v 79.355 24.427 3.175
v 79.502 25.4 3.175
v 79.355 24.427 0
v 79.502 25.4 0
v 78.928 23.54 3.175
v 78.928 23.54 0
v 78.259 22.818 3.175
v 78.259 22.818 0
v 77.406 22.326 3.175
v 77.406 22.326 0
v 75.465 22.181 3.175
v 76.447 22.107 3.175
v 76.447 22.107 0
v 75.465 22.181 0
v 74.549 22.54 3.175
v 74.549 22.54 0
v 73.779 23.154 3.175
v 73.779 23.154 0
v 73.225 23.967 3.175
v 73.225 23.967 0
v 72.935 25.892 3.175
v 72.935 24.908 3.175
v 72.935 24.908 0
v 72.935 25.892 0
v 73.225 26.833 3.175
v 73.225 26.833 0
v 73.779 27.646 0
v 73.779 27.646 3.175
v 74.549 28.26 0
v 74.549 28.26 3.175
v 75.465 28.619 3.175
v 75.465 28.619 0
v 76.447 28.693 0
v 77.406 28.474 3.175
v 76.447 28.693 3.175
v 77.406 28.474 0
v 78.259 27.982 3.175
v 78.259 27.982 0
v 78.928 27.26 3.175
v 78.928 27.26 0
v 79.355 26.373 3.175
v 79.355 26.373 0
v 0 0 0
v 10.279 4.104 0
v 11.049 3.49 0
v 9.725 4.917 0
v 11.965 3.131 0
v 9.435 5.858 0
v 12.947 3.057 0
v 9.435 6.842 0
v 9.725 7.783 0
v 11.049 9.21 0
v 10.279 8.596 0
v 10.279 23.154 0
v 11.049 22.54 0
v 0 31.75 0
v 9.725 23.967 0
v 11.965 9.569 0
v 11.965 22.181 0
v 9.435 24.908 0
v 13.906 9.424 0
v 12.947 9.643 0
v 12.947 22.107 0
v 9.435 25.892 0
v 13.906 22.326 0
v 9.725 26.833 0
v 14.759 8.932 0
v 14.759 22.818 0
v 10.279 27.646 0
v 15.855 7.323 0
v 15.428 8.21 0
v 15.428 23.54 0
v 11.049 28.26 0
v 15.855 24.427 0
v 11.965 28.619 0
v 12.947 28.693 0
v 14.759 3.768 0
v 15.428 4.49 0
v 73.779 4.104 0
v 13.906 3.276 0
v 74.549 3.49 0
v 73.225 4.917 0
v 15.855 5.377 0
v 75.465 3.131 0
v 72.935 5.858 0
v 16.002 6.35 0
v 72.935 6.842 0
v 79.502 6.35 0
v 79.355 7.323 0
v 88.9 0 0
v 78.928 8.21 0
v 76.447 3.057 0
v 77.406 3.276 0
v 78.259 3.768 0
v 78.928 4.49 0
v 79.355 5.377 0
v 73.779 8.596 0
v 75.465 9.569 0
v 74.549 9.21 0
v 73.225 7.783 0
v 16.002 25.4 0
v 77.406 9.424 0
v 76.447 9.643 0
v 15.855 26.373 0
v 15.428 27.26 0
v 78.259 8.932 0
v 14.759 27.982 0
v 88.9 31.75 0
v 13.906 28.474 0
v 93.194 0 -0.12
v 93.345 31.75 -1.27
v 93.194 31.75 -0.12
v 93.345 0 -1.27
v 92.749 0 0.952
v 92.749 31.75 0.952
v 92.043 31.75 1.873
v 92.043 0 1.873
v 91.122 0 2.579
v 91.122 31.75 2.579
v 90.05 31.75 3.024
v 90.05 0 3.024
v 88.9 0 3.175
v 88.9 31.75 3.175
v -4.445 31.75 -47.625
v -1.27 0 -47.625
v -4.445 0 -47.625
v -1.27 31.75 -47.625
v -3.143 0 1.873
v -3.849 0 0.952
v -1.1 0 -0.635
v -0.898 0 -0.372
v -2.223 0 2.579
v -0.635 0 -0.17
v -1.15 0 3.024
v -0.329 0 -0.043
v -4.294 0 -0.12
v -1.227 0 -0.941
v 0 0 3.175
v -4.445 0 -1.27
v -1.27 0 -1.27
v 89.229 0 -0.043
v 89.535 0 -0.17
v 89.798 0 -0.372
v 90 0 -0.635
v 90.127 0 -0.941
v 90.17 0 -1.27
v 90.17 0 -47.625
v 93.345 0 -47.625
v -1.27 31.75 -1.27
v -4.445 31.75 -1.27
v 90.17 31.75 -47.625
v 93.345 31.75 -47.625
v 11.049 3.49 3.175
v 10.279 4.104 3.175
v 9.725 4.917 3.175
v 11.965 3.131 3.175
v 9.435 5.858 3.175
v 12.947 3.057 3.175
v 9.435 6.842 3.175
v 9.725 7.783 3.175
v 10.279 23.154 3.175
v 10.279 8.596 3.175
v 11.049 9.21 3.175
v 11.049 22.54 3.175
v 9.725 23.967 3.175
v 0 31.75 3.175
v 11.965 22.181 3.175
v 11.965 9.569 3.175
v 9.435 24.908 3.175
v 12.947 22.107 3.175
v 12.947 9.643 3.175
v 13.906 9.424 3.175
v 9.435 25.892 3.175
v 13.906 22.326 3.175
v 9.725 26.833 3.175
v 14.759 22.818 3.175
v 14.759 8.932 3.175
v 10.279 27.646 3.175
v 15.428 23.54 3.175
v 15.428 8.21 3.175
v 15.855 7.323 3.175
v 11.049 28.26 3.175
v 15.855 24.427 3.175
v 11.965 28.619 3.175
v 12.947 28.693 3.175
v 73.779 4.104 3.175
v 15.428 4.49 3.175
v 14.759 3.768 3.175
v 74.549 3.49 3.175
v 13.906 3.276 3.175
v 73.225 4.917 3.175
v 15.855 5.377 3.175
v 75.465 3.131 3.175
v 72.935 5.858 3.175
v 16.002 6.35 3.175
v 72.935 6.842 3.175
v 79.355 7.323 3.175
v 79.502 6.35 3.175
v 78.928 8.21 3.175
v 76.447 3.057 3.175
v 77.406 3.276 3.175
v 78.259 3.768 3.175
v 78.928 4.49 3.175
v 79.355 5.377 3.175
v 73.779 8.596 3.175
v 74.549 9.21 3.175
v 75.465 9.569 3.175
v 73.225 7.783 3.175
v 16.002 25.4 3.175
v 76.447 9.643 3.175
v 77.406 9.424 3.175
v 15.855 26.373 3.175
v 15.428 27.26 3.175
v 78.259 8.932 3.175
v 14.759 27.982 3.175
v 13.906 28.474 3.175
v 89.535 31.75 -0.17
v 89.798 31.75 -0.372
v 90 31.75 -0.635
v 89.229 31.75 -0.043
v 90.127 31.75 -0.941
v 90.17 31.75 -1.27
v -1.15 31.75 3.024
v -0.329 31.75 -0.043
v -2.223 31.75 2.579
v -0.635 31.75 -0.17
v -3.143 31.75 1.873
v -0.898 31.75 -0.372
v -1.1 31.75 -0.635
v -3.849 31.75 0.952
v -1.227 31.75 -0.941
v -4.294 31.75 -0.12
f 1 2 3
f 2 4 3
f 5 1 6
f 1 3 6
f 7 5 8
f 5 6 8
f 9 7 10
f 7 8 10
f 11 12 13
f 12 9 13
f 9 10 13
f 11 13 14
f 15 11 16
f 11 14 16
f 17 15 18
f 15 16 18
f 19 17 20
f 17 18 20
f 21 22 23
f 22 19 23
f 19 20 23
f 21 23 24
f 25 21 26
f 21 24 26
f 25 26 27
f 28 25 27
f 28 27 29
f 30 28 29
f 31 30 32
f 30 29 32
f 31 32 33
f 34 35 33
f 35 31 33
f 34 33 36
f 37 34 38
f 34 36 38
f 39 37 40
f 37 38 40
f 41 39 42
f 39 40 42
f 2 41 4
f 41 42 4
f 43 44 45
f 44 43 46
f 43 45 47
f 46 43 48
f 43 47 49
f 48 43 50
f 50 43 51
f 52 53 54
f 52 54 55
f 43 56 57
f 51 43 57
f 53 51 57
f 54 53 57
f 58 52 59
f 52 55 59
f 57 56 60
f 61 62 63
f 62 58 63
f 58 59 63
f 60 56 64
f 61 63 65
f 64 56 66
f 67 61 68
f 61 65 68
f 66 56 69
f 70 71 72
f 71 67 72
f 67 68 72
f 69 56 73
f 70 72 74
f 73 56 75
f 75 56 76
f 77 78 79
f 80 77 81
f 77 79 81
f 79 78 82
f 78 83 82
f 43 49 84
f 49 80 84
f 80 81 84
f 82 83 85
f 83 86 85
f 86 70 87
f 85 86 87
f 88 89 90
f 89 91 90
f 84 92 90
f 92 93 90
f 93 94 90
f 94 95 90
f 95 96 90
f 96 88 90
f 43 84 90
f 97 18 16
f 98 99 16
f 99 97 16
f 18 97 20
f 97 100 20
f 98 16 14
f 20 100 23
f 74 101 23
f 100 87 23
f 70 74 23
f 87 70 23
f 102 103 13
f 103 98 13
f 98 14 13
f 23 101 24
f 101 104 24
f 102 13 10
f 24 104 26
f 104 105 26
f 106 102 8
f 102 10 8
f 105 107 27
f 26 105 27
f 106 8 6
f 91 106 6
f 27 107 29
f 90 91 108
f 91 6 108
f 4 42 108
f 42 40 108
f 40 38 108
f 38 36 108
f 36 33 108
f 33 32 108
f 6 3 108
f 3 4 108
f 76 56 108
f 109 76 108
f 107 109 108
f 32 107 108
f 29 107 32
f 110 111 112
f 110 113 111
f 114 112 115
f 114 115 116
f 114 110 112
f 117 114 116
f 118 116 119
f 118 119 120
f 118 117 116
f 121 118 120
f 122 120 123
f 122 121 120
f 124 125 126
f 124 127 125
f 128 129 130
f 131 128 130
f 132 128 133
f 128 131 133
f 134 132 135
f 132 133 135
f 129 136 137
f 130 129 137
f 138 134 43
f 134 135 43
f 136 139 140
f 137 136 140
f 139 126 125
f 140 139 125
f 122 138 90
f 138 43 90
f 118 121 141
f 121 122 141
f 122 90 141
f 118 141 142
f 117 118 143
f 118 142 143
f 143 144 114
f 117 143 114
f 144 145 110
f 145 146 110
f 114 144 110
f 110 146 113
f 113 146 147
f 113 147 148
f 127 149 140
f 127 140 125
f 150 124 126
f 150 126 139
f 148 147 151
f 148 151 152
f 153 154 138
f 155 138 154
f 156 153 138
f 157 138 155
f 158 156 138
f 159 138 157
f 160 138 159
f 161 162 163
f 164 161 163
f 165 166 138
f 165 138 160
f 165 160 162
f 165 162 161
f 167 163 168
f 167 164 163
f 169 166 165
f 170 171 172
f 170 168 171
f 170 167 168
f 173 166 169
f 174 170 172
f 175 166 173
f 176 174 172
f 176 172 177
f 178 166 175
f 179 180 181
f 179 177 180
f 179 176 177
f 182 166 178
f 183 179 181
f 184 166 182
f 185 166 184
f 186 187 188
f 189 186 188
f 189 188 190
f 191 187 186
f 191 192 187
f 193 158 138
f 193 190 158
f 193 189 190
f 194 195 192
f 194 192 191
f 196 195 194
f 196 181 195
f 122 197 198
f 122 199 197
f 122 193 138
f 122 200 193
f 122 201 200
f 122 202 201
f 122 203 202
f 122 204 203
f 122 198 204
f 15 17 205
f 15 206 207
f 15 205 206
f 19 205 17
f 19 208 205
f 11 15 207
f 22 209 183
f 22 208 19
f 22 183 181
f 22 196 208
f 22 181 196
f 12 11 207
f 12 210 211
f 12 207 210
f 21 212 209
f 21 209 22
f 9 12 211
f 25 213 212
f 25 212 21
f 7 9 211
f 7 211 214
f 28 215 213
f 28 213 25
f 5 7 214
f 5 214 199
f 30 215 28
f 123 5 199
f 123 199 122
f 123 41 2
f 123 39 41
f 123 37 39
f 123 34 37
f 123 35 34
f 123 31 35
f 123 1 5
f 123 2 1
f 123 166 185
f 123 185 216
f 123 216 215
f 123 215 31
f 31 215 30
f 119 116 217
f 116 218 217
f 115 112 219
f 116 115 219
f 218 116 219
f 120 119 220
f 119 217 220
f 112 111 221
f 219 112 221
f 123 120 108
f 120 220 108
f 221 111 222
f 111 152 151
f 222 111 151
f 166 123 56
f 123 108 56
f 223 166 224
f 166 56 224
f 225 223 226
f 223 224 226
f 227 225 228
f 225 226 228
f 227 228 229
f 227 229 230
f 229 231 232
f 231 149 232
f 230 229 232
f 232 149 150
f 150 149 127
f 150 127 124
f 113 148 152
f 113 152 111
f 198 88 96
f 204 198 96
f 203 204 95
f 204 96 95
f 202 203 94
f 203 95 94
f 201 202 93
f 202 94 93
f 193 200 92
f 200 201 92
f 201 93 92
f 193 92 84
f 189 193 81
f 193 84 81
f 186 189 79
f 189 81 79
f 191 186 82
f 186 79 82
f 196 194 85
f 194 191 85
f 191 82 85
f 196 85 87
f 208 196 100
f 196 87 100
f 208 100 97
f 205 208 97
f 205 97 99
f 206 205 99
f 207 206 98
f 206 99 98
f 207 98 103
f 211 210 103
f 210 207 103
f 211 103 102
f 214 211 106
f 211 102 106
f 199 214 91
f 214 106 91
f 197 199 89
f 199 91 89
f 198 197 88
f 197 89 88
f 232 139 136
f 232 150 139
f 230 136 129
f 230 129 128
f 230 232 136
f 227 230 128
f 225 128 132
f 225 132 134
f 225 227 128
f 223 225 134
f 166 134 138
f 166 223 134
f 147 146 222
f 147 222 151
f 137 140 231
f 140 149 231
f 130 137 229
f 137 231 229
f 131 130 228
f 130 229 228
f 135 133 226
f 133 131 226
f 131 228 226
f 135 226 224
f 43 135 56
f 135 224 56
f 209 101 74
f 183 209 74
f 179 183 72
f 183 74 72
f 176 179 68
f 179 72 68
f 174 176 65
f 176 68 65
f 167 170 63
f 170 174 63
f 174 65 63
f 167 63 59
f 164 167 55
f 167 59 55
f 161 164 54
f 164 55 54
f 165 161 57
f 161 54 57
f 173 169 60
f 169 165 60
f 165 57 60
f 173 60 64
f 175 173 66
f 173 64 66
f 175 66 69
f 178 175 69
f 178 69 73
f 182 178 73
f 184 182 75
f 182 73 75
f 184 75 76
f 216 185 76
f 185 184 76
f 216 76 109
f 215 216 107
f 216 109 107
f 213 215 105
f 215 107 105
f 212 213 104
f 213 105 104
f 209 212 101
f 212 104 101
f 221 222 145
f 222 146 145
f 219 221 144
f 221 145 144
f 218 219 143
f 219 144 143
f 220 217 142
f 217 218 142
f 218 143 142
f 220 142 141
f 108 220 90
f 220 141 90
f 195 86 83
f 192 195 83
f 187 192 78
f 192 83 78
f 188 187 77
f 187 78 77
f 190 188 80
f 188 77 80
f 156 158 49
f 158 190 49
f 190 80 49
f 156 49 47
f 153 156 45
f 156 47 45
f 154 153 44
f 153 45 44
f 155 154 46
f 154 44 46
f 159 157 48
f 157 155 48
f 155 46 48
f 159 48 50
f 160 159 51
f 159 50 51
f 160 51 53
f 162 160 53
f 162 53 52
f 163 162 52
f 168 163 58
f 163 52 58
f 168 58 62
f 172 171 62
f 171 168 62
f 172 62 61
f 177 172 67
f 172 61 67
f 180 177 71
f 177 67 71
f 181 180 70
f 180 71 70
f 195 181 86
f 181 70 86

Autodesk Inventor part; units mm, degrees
ref_plane "YZ Plane" through (0, 0, 0) normal (1, 0, 0) x (0, 1, 0)
ref_plane "XZ Plane" through (0, 0, 0) normal (0, 1, 0) x (-1, 0, 0)
ref_plane "XY Plane" through (0, 0, 0) normal (0, 0, 1) x (1, 0, 0)
sketch "Sketch1" plane through (0, 0, 0) normal (0, 0, 1) x (1, 0, 0)
  line L0 (0, 0) -> (88.9, 0)
  line L1 (88.9, 0) -> (88.9, 31.75)
  line L2 (88.9, 31.75) -> (0, 31.75)
  line L3 (0, 31.75) -> (0, 0)
  circle A0 centre (12.7, 25.4) radius 3.302
  circle A1 centre (76.2, 25.4) radius 3.302
  circle A2 centre (12.7, 6.35) radius 3.302
  circle A3 centre (76.2, 6.35) radius 3.302
  line L4 (12.7, 25.4) -> (76.2, 25.4) construction
  line L5 (44.45, 31.75) -> (44.45, 0) construction
  point P0 (44.45, 25.4)
  dimension "d0" = 88.9
  dimension "d2" = 31.75
  dimension "d5" = 63.5
  dimension "d8" = 19.05
  dimension "d11" = 6.35
  dimension "d12" = 6.604
extrude "Plate1" add sketch "Sketch1" along normal blind 3.175
sketch "Sketch2" plane through (90.17, 0, -1.27) normal (1, 0, 0) x (0, 1, 0)
  line L0 (31.75, 0) -> (0, 0)
  line L1 (0, 0) -> (0, -46.355)
  line L2 (0, -46.355) -> (31.75, -46.355)
  line L3 (31.75, -46.355) -> (31.75, 0)
edge flange "Flange1" height 50.8 angle 90 thickness 3.175 bend radius 1.27 thickness toward (1, 0, 0) relief straight relief width 3.175 relief depth 1.5875 corner gap 3.175 corner form 0 edges at (88.9, 15.875, 0) (0, 15.875, 0) wall of the first edge with corners at (90.17, 31.75, -1.27) (90.17, 0, -1.27) (90.17, 0, -47.625) (90.17, 31.75, -47.625)
bend "Bend1"
corner "Corner1"
equation "\"d16\" = BendReliefWidth"
equation "\"d17\" = BendReliefDepth"
equation "\"d18\" = MinimumRemnant"
equation "\"d19\" = BendRadius"
equation "\"d23\" = CornerReliefSize"
equation "\"d24\" = GapSize"
equation "\"d25\" = JacobiRadiusSize"
equation "\"BendRadius\" = Thickness"
equation "\"BendReliefWidth\" = Thickness"
equation "\"BendReliefDepth\" = 0.5 * Thickness"
equation "\"CornerReliefSize\" = 4 * Thickness"
equation "\"MinimumRemnant\" = 2 * Thickness"
equation "\"TransitionRadius\" = BendRadius"
equation "\"JacobiRadiusSize\" = Thickness"
equation "\"GapSize\" = Thickness"
equation "\"d15\" = BendRadius"
equation "\"Thickness\" = 3.175"
properties part number "M - Upper Rail Connector Bracket 1" material "Aluminum 6061"
